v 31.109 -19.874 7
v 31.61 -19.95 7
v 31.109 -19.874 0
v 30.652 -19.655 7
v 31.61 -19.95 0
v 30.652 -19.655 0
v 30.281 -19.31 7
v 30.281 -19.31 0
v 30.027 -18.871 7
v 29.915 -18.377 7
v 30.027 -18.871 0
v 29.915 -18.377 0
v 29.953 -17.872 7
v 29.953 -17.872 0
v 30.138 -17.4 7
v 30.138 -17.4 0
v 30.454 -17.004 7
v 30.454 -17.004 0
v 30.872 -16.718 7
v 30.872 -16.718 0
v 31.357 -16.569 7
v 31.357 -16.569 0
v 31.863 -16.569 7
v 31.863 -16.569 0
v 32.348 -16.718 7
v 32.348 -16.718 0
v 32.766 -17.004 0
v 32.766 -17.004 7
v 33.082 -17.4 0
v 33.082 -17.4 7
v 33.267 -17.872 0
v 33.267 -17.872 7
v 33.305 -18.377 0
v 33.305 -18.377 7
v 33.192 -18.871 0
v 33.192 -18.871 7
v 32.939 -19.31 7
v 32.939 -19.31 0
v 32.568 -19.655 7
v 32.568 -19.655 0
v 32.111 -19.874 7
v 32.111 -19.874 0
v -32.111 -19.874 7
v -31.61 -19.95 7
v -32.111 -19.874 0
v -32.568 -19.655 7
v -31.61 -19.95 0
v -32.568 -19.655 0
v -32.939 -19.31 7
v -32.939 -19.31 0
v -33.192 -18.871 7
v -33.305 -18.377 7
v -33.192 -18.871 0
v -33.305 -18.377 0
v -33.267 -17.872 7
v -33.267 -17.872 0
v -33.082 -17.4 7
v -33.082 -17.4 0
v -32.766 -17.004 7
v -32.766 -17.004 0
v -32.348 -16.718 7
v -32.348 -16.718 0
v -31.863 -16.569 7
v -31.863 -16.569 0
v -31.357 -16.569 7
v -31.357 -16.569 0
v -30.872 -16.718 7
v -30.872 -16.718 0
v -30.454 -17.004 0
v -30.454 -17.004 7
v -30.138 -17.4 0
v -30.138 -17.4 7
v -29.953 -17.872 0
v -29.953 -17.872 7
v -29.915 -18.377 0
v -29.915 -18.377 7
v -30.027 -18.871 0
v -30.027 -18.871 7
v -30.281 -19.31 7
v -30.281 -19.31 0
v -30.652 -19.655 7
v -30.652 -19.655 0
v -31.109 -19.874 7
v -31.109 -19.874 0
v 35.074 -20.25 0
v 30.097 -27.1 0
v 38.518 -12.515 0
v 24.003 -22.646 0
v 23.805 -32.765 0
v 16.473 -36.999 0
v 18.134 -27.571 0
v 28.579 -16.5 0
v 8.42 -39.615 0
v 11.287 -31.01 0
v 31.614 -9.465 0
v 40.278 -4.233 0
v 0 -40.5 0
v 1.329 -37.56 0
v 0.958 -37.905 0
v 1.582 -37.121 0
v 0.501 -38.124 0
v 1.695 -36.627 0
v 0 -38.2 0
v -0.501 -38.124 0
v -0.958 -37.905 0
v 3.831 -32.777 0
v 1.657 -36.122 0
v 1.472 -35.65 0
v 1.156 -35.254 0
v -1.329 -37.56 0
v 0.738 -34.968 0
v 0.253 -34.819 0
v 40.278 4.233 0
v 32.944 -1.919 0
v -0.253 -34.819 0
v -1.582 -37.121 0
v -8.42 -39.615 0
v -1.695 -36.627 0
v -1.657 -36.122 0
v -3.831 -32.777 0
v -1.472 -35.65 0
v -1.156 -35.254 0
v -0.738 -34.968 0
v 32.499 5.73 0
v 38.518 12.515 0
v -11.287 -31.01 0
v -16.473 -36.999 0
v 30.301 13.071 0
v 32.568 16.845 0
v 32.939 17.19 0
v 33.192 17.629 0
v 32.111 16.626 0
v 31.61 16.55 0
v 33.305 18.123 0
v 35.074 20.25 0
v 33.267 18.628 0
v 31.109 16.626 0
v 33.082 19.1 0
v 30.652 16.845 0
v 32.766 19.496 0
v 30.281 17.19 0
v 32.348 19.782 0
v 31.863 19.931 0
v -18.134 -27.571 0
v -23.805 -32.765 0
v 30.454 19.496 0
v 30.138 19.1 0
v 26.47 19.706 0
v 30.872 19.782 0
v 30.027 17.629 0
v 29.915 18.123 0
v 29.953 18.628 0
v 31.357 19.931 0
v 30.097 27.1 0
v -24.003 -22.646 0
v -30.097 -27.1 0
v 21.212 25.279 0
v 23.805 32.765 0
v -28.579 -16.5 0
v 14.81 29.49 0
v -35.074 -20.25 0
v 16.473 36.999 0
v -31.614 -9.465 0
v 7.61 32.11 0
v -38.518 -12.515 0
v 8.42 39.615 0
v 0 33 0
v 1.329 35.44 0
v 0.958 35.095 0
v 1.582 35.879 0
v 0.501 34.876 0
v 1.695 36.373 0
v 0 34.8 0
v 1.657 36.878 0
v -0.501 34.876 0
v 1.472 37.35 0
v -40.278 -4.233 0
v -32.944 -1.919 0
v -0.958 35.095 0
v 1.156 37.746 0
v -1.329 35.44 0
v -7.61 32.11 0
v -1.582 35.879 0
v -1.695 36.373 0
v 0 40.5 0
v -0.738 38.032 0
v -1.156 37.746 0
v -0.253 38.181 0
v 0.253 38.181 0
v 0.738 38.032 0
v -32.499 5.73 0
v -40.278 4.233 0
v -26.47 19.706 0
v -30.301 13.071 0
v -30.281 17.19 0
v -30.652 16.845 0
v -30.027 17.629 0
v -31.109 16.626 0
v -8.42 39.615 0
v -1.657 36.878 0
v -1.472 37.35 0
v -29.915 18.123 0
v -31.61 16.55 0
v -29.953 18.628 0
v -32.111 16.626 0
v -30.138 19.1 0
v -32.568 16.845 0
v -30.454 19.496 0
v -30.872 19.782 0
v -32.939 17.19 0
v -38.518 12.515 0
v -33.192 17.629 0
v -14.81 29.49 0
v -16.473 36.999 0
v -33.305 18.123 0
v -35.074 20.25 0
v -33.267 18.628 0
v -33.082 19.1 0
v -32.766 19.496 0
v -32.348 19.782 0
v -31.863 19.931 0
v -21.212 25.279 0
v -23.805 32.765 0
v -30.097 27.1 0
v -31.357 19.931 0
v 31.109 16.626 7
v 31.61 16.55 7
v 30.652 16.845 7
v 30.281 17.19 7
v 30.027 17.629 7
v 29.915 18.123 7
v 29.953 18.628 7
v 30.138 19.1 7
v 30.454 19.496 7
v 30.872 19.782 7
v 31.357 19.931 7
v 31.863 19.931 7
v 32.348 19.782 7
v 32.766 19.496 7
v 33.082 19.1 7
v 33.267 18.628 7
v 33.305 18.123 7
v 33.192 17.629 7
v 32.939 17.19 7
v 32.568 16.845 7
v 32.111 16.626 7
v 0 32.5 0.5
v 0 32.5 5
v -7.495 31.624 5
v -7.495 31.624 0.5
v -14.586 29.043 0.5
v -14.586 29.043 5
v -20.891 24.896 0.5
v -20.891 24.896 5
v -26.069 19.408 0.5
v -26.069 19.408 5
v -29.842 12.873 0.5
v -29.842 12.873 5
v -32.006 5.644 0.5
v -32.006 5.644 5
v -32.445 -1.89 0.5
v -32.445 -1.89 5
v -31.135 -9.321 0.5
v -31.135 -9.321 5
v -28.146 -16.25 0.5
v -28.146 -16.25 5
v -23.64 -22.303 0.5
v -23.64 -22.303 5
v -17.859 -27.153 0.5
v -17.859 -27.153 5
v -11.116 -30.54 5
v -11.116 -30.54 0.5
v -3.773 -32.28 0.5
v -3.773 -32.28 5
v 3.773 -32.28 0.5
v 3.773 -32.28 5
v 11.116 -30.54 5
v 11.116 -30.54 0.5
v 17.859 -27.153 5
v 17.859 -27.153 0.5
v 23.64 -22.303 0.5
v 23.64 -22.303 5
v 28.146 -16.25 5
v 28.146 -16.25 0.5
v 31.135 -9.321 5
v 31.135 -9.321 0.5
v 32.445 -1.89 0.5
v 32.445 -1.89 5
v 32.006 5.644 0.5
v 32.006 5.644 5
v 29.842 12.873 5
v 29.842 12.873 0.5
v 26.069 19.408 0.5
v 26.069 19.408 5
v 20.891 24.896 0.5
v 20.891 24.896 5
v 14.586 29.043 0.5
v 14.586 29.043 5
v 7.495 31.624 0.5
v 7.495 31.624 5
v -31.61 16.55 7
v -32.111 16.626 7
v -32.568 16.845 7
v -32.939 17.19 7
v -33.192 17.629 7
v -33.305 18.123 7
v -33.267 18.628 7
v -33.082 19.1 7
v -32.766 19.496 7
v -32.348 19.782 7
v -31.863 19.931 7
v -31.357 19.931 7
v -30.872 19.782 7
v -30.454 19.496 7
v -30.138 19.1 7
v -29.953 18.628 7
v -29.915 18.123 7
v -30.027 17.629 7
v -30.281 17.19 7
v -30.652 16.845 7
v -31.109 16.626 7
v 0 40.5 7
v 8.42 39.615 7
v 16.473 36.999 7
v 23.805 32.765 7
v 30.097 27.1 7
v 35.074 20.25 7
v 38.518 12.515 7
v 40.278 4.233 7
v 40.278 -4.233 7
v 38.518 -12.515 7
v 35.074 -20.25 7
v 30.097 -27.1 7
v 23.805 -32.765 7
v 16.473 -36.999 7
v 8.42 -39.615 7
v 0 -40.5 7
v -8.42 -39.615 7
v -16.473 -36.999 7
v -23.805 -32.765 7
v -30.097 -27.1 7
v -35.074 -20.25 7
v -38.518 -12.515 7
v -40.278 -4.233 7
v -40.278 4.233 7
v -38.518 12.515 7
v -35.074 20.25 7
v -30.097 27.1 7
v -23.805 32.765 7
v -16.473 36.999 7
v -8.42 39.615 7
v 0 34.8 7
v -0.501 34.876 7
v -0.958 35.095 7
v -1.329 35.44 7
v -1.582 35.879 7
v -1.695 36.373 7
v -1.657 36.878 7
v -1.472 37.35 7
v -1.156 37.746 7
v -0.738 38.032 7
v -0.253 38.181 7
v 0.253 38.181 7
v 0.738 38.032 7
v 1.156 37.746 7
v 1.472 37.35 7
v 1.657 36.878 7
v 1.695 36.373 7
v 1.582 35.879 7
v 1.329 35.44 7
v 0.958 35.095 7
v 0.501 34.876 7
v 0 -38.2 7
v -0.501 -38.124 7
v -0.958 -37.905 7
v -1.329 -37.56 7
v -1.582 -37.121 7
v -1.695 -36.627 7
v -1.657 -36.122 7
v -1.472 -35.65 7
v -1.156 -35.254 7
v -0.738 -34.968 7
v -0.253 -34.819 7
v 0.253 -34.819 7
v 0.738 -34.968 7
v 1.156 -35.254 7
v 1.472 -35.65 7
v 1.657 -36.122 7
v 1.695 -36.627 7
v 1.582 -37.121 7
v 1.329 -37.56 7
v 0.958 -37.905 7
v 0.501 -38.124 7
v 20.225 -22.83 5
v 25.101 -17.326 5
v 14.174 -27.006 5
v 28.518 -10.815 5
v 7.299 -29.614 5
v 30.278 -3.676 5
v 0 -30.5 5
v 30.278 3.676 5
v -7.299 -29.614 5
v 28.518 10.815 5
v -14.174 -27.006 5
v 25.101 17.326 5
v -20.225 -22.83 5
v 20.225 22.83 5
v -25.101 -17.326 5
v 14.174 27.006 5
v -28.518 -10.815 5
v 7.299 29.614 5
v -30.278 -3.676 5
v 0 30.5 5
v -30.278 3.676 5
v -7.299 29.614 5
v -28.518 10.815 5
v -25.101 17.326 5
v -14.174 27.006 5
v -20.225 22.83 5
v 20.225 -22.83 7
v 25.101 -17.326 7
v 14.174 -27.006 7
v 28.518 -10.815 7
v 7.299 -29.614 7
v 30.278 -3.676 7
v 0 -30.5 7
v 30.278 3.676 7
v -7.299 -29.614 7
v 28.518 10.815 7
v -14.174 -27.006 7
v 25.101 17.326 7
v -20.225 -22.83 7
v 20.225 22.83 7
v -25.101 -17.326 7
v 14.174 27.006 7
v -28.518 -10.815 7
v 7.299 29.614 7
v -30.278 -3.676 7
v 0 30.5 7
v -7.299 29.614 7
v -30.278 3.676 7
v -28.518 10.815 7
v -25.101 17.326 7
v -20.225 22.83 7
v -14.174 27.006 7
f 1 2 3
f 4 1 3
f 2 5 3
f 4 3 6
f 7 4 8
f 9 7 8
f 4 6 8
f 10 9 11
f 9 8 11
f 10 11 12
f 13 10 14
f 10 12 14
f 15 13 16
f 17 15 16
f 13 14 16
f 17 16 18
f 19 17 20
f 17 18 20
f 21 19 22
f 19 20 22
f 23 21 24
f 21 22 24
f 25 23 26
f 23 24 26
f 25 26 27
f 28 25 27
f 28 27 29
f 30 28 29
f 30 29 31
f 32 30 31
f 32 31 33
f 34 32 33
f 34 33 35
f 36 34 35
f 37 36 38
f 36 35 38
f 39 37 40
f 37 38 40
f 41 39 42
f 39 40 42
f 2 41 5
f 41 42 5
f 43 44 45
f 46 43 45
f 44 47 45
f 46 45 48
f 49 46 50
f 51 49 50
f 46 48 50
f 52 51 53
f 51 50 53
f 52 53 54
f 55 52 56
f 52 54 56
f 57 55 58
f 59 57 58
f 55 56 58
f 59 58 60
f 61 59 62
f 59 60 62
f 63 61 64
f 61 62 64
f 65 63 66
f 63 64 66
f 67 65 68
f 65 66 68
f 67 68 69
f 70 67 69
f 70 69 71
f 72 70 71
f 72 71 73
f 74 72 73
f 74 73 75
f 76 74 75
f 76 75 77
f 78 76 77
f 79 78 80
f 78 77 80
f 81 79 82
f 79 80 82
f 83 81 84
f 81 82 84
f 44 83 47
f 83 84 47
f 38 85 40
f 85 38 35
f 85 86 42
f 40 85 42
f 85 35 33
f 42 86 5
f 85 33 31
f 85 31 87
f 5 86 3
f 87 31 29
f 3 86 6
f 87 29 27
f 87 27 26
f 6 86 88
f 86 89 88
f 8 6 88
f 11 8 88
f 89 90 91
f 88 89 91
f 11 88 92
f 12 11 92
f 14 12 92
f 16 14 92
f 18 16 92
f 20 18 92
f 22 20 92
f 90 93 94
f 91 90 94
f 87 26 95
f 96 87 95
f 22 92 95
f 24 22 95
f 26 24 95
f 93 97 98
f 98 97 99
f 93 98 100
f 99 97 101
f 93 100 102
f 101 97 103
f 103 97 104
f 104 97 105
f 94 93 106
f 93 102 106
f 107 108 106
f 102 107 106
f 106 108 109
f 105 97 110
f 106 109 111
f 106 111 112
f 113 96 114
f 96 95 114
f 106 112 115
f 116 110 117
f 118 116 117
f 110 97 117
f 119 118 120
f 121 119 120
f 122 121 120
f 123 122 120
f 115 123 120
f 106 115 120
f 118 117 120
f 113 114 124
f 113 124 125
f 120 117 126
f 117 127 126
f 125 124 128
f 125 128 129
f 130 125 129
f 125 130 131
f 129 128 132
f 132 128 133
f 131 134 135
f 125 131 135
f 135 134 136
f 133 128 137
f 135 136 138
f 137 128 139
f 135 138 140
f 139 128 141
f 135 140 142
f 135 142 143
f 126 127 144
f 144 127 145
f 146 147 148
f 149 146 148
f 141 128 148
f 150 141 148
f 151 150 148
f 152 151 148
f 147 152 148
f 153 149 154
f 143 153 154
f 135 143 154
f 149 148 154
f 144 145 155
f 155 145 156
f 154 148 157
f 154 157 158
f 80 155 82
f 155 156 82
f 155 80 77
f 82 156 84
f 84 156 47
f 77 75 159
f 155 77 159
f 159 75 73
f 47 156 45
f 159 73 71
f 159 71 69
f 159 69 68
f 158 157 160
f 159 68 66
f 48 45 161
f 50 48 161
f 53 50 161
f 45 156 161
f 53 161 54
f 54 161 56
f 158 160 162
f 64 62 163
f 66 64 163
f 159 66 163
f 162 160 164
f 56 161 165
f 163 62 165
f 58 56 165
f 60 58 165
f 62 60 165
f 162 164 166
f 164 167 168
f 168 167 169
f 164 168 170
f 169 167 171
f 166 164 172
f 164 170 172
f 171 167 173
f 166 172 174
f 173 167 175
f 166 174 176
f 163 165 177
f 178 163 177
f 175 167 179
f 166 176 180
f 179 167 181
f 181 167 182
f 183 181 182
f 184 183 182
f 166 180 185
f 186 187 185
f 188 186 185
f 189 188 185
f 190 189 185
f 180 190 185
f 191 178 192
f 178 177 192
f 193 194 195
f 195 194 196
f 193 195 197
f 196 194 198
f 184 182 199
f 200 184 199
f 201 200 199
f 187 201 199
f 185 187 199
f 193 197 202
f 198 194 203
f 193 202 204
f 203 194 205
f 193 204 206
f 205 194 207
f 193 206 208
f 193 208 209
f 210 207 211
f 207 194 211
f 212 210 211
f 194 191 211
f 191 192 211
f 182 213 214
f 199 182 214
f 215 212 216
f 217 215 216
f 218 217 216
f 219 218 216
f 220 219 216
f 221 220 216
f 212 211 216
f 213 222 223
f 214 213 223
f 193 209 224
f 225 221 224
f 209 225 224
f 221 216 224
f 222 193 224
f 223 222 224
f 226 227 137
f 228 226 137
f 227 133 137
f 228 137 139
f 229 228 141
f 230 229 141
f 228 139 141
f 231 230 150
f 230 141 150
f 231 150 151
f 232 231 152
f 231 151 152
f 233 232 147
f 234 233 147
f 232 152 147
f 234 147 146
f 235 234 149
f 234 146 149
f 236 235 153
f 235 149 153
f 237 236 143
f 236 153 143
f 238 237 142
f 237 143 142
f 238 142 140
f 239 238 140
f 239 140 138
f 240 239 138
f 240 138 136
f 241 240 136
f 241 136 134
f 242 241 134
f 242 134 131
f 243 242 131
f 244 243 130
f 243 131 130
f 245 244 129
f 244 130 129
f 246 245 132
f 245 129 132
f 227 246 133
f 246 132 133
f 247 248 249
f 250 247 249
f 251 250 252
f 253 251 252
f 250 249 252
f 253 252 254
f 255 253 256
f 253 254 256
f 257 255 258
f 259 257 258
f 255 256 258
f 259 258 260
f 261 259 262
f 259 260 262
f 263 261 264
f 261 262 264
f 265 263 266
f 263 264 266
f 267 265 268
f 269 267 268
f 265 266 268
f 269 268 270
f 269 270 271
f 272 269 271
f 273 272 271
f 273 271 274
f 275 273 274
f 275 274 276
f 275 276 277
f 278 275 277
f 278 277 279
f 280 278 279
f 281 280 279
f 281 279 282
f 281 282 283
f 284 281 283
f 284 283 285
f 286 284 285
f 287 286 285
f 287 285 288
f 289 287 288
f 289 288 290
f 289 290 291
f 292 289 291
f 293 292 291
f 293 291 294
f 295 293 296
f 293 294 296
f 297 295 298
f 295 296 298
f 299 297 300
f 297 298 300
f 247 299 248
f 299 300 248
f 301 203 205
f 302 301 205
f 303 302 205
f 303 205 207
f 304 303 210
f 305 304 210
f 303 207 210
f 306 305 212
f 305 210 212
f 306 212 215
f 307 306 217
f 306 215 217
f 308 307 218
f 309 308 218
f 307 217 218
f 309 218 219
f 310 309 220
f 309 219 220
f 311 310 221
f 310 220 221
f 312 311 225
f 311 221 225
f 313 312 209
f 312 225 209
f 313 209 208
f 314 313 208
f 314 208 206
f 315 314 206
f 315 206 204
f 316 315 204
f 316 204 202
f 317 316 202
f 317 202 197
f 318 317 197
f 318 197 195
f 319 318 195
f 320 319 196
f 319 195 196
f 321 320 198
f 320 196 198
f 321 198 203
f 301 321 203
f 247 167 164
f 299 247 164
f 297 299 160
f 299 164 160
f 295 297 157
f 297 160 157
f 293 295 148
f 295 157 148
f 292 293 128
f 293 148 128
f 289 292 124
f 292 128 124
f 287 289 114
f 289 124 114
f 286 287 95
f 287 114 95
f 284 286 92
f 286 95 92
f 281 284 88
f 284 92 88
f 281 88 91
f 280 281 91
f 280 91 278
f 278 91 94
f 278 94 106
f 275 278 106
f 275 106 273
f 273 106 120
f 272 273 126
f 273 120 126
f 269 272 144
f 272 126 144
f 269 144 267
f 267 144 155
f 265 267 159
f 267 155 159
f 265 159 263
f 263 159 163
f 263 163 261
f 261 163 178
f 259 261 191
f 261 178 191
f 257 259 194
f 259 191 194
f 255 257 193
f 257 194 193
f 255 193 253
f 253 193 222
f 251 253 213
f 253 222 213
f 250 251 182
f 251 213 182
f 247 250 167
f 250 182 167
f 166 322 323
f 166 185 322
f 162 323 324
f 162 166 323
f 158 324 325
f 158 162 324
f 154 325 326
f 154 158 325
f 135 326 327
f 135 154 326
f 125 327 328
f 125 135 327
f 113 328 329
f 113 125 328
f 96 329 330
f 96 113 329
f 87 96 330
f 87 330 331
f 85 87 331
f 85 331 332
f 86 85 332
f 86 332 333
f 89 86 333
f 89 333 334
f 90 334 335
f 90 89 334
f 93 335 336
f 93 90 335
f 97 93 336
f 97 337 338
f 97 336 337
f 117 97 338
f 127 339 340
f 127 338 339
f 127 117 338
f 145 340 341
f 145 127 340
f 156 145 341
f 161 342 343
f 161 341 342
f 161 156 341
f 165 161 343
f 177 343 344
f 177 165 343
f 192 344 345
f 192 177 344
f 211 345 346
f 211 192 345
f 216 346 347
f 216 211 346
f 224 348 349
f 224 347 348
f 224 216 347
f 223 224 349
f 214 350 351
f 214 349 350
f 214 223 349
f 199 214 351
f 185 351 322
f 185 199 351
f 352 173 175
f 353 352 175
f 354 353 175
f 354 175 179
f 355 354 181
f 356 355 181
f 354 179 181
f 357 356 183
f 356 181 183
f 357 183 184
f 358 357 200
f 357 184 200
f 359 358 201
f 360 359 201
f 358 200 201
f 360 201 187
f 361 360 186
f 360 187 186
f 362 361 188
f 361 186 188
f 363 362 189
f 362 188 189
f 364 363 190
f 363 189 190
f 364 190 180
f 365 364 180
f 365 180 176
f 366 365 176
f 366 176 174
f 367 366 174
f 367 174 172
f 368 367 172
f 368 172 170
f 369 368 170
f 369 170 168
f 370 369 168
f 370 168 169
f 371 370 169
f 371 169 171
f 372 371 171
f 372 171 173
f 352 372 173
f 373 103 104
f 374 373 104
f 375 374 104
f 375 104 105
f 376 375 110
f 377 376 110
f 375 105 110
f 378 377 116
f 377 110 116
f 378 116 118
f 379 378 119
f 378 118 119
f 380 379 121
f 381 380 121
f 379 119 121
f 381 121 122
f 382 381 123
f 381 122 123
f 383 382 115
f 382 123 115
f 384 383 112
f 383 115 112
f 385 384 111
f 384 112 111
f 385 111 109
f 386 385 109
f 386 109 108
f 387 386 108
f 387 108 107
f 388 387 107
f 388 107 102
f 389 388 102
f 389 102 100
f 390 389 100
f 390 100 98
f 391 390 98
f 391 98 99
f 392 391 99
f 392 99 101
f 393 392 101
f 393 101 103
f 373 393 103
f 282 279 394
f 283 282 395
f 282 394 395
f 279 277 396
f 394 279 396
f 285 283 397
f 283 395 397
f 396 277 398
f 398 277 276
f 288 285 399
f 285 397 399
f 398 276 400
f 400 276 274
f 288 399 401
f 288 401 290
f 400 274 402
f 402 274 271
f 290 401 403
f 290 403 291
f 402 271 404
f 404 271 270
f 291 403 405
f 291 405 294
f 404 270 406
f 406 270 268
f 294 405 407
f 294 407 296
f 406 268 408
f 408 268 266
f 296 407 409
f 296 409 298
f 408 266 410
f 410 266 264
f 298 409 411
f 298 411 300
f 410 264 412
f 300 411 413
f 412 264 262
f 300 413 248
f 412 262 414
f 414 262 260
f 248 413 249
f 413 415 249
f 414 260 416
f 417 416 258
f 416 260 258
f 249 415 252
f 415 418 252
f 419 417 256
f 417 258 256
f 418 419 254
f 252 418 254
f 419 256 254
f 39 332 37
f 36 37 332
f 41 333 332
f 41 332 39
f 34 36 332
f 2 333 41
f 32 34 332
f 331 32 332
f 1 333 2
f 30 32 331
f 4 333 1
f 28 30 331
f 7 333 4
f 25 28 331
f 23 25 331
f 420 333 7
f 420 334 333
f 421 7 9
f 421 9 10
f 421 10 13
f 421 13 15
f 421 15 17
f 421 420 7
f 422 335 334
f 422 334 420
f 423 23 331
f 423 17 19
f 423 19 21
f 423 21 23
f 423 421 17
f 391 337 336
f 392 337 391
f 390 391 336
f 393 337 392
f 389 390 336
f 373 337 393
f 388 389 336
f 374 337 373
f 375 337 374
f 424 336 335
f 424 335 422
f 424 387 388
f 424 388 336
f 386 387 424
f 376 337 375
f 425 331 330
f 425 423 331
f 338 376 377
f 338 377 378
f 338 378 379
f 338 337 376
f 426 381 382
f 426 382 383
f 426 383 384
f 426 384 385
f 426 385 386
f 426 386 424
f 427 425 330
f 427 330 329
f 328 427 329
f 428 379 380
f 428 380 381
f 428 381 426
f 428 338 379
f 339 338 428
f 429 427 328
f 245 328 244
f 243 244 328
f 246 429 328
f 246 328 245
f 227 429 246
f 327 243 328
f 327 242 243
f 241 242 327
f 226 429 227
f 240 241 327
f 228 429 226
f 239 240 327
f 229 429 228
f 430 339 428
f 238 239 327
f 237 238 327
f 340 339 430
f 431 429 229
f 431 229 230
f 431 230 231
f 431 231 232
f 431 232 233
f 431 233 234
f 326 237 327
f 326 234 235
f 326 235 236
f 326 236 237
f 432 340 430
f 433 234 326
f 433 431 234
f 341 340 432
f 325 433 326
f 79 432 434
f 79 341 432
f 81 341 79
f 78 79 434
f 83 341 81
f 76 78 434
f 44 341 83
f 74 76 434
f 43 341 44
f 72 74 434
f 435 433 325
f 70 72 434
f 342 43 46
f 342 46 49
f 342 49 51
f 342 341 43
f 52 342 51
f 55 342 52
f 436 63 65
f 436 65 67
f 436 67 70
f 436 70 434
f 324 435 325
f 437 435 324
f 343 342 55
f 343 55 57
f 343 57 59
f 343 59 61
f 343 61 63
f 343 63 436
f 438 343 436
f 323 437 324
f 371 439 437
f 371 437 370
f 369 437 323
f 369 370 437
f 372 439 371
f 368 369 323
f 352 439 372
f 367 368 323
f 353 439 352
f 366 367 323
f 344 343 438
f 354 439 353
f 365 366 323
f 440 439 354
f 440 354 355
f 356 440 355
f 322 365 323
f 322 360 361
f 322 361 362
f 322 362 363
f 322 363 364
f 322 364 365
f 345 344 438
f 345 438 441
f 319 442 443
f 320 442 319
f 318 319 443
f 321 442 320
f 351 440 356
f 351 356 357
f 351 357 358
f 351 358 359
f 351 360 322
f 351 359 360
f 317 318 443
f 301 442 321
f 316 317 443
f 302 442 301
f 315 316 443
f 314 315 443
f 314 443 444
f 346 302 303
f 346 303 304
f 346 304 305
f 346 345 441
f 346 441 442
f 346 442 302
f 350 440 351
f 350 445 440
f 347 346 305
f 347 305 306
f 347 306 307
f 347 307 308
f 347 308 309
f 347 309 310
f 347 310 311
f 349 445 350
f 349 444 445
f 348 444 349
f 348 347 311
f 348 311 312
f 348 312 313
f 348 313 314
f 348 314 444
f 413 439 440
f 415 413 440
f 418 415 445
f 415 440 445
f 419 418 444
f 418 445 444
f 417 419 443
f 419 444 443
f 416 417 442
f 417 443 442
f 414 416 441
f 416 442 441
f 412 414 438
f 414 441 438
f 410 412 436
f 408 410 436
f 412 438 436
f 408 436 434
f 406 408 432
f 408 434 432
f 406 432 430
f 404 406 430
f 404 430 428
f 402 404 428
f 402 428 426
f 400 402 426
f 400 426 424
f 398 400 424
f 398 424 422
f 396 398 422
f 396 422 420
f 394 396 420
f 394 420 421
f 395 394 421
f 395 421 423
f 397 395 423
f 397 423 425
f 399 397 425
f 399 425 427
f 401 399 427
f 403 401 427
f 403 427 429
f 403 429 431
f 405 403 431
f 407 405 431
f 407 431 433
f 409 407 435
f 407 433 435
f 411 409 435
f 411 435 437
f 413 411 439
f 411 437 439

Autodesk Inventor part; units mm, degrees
ref_plane "YZ Plane" through (0, 0, 0) normal (1, 0, 0) x (0, 1, 0)
ref_plane "XZ Plane" through (0, 0, 0) normal (0, 1, 0) x (-1, 0, 0)
ref_plane "XY Plane" through (0, 0, 0) normal (0, 0, 1) x (1, 0, 0)
sketch "スケッチ1" plane through (0, 0, 0) normal (1, 0, 0) x (0, 1, 0)
  line L0 (32.5, 0) -> (32.5, 5)
  line L1 (32.5, 5) -> (30.5, 5)
  line L2 (30.5, 5) -> (30.5, 7)
  line L3 (30.5, 7) -> (40.5, 7)
  line L4 (40.5, 7) -> (40.5, 0)
  line L5 (40.5, 0) -> (32.5, 0)
  line L6 (0, -1.4) -> (0, 8.4) projected
  point P0 (0, 0)
  dimension "d0" = 32.5
  dimension "d1" = 5
  dimension "d2" = 2
  dimension "d3" = 2
  dimension "d22" = 8
revolve "回転1" add sketch "スケッチ1" angle 360 about axis through (0, 0, -10) along (0, 0, 1)
sketch "スケッチ2" plane through (0, 0, 7) normal (0, 0, 1) x (1, 0, 0)
  circle A0 centre (0, 0) radius 36.5
  point P0 (0, 36.5)
  point P1 (-31.6099, 18.25)
  point P2 (-31.6099, -18.25)
  point P3 (0, -36.5)
  point P4 (31.6099, -18.25)
  point P5 (31.6099, 18.25)
  dimension "d6" = 73
  dimension "d16" = 360
hole "穴1" at (31.6099, 18.25, 7) at (31.6099, -18.25, 7) at (0, -36.5, 7) at (-31.6099, -18.25, 7) at (-31.6099, 18.25, 7) at (0, 36.5, 7) direction (0, 0, -1) diameter 3.4 end through all clearance for "Socket Head Cap Screw" size "M3" standard "Ansi Metric M Profile"
chamfer "面取り1" distance 0.5 angle 45 1 edges at (0, -32.5, 0)
properties part number "base2" material "ABS プラスチック"
